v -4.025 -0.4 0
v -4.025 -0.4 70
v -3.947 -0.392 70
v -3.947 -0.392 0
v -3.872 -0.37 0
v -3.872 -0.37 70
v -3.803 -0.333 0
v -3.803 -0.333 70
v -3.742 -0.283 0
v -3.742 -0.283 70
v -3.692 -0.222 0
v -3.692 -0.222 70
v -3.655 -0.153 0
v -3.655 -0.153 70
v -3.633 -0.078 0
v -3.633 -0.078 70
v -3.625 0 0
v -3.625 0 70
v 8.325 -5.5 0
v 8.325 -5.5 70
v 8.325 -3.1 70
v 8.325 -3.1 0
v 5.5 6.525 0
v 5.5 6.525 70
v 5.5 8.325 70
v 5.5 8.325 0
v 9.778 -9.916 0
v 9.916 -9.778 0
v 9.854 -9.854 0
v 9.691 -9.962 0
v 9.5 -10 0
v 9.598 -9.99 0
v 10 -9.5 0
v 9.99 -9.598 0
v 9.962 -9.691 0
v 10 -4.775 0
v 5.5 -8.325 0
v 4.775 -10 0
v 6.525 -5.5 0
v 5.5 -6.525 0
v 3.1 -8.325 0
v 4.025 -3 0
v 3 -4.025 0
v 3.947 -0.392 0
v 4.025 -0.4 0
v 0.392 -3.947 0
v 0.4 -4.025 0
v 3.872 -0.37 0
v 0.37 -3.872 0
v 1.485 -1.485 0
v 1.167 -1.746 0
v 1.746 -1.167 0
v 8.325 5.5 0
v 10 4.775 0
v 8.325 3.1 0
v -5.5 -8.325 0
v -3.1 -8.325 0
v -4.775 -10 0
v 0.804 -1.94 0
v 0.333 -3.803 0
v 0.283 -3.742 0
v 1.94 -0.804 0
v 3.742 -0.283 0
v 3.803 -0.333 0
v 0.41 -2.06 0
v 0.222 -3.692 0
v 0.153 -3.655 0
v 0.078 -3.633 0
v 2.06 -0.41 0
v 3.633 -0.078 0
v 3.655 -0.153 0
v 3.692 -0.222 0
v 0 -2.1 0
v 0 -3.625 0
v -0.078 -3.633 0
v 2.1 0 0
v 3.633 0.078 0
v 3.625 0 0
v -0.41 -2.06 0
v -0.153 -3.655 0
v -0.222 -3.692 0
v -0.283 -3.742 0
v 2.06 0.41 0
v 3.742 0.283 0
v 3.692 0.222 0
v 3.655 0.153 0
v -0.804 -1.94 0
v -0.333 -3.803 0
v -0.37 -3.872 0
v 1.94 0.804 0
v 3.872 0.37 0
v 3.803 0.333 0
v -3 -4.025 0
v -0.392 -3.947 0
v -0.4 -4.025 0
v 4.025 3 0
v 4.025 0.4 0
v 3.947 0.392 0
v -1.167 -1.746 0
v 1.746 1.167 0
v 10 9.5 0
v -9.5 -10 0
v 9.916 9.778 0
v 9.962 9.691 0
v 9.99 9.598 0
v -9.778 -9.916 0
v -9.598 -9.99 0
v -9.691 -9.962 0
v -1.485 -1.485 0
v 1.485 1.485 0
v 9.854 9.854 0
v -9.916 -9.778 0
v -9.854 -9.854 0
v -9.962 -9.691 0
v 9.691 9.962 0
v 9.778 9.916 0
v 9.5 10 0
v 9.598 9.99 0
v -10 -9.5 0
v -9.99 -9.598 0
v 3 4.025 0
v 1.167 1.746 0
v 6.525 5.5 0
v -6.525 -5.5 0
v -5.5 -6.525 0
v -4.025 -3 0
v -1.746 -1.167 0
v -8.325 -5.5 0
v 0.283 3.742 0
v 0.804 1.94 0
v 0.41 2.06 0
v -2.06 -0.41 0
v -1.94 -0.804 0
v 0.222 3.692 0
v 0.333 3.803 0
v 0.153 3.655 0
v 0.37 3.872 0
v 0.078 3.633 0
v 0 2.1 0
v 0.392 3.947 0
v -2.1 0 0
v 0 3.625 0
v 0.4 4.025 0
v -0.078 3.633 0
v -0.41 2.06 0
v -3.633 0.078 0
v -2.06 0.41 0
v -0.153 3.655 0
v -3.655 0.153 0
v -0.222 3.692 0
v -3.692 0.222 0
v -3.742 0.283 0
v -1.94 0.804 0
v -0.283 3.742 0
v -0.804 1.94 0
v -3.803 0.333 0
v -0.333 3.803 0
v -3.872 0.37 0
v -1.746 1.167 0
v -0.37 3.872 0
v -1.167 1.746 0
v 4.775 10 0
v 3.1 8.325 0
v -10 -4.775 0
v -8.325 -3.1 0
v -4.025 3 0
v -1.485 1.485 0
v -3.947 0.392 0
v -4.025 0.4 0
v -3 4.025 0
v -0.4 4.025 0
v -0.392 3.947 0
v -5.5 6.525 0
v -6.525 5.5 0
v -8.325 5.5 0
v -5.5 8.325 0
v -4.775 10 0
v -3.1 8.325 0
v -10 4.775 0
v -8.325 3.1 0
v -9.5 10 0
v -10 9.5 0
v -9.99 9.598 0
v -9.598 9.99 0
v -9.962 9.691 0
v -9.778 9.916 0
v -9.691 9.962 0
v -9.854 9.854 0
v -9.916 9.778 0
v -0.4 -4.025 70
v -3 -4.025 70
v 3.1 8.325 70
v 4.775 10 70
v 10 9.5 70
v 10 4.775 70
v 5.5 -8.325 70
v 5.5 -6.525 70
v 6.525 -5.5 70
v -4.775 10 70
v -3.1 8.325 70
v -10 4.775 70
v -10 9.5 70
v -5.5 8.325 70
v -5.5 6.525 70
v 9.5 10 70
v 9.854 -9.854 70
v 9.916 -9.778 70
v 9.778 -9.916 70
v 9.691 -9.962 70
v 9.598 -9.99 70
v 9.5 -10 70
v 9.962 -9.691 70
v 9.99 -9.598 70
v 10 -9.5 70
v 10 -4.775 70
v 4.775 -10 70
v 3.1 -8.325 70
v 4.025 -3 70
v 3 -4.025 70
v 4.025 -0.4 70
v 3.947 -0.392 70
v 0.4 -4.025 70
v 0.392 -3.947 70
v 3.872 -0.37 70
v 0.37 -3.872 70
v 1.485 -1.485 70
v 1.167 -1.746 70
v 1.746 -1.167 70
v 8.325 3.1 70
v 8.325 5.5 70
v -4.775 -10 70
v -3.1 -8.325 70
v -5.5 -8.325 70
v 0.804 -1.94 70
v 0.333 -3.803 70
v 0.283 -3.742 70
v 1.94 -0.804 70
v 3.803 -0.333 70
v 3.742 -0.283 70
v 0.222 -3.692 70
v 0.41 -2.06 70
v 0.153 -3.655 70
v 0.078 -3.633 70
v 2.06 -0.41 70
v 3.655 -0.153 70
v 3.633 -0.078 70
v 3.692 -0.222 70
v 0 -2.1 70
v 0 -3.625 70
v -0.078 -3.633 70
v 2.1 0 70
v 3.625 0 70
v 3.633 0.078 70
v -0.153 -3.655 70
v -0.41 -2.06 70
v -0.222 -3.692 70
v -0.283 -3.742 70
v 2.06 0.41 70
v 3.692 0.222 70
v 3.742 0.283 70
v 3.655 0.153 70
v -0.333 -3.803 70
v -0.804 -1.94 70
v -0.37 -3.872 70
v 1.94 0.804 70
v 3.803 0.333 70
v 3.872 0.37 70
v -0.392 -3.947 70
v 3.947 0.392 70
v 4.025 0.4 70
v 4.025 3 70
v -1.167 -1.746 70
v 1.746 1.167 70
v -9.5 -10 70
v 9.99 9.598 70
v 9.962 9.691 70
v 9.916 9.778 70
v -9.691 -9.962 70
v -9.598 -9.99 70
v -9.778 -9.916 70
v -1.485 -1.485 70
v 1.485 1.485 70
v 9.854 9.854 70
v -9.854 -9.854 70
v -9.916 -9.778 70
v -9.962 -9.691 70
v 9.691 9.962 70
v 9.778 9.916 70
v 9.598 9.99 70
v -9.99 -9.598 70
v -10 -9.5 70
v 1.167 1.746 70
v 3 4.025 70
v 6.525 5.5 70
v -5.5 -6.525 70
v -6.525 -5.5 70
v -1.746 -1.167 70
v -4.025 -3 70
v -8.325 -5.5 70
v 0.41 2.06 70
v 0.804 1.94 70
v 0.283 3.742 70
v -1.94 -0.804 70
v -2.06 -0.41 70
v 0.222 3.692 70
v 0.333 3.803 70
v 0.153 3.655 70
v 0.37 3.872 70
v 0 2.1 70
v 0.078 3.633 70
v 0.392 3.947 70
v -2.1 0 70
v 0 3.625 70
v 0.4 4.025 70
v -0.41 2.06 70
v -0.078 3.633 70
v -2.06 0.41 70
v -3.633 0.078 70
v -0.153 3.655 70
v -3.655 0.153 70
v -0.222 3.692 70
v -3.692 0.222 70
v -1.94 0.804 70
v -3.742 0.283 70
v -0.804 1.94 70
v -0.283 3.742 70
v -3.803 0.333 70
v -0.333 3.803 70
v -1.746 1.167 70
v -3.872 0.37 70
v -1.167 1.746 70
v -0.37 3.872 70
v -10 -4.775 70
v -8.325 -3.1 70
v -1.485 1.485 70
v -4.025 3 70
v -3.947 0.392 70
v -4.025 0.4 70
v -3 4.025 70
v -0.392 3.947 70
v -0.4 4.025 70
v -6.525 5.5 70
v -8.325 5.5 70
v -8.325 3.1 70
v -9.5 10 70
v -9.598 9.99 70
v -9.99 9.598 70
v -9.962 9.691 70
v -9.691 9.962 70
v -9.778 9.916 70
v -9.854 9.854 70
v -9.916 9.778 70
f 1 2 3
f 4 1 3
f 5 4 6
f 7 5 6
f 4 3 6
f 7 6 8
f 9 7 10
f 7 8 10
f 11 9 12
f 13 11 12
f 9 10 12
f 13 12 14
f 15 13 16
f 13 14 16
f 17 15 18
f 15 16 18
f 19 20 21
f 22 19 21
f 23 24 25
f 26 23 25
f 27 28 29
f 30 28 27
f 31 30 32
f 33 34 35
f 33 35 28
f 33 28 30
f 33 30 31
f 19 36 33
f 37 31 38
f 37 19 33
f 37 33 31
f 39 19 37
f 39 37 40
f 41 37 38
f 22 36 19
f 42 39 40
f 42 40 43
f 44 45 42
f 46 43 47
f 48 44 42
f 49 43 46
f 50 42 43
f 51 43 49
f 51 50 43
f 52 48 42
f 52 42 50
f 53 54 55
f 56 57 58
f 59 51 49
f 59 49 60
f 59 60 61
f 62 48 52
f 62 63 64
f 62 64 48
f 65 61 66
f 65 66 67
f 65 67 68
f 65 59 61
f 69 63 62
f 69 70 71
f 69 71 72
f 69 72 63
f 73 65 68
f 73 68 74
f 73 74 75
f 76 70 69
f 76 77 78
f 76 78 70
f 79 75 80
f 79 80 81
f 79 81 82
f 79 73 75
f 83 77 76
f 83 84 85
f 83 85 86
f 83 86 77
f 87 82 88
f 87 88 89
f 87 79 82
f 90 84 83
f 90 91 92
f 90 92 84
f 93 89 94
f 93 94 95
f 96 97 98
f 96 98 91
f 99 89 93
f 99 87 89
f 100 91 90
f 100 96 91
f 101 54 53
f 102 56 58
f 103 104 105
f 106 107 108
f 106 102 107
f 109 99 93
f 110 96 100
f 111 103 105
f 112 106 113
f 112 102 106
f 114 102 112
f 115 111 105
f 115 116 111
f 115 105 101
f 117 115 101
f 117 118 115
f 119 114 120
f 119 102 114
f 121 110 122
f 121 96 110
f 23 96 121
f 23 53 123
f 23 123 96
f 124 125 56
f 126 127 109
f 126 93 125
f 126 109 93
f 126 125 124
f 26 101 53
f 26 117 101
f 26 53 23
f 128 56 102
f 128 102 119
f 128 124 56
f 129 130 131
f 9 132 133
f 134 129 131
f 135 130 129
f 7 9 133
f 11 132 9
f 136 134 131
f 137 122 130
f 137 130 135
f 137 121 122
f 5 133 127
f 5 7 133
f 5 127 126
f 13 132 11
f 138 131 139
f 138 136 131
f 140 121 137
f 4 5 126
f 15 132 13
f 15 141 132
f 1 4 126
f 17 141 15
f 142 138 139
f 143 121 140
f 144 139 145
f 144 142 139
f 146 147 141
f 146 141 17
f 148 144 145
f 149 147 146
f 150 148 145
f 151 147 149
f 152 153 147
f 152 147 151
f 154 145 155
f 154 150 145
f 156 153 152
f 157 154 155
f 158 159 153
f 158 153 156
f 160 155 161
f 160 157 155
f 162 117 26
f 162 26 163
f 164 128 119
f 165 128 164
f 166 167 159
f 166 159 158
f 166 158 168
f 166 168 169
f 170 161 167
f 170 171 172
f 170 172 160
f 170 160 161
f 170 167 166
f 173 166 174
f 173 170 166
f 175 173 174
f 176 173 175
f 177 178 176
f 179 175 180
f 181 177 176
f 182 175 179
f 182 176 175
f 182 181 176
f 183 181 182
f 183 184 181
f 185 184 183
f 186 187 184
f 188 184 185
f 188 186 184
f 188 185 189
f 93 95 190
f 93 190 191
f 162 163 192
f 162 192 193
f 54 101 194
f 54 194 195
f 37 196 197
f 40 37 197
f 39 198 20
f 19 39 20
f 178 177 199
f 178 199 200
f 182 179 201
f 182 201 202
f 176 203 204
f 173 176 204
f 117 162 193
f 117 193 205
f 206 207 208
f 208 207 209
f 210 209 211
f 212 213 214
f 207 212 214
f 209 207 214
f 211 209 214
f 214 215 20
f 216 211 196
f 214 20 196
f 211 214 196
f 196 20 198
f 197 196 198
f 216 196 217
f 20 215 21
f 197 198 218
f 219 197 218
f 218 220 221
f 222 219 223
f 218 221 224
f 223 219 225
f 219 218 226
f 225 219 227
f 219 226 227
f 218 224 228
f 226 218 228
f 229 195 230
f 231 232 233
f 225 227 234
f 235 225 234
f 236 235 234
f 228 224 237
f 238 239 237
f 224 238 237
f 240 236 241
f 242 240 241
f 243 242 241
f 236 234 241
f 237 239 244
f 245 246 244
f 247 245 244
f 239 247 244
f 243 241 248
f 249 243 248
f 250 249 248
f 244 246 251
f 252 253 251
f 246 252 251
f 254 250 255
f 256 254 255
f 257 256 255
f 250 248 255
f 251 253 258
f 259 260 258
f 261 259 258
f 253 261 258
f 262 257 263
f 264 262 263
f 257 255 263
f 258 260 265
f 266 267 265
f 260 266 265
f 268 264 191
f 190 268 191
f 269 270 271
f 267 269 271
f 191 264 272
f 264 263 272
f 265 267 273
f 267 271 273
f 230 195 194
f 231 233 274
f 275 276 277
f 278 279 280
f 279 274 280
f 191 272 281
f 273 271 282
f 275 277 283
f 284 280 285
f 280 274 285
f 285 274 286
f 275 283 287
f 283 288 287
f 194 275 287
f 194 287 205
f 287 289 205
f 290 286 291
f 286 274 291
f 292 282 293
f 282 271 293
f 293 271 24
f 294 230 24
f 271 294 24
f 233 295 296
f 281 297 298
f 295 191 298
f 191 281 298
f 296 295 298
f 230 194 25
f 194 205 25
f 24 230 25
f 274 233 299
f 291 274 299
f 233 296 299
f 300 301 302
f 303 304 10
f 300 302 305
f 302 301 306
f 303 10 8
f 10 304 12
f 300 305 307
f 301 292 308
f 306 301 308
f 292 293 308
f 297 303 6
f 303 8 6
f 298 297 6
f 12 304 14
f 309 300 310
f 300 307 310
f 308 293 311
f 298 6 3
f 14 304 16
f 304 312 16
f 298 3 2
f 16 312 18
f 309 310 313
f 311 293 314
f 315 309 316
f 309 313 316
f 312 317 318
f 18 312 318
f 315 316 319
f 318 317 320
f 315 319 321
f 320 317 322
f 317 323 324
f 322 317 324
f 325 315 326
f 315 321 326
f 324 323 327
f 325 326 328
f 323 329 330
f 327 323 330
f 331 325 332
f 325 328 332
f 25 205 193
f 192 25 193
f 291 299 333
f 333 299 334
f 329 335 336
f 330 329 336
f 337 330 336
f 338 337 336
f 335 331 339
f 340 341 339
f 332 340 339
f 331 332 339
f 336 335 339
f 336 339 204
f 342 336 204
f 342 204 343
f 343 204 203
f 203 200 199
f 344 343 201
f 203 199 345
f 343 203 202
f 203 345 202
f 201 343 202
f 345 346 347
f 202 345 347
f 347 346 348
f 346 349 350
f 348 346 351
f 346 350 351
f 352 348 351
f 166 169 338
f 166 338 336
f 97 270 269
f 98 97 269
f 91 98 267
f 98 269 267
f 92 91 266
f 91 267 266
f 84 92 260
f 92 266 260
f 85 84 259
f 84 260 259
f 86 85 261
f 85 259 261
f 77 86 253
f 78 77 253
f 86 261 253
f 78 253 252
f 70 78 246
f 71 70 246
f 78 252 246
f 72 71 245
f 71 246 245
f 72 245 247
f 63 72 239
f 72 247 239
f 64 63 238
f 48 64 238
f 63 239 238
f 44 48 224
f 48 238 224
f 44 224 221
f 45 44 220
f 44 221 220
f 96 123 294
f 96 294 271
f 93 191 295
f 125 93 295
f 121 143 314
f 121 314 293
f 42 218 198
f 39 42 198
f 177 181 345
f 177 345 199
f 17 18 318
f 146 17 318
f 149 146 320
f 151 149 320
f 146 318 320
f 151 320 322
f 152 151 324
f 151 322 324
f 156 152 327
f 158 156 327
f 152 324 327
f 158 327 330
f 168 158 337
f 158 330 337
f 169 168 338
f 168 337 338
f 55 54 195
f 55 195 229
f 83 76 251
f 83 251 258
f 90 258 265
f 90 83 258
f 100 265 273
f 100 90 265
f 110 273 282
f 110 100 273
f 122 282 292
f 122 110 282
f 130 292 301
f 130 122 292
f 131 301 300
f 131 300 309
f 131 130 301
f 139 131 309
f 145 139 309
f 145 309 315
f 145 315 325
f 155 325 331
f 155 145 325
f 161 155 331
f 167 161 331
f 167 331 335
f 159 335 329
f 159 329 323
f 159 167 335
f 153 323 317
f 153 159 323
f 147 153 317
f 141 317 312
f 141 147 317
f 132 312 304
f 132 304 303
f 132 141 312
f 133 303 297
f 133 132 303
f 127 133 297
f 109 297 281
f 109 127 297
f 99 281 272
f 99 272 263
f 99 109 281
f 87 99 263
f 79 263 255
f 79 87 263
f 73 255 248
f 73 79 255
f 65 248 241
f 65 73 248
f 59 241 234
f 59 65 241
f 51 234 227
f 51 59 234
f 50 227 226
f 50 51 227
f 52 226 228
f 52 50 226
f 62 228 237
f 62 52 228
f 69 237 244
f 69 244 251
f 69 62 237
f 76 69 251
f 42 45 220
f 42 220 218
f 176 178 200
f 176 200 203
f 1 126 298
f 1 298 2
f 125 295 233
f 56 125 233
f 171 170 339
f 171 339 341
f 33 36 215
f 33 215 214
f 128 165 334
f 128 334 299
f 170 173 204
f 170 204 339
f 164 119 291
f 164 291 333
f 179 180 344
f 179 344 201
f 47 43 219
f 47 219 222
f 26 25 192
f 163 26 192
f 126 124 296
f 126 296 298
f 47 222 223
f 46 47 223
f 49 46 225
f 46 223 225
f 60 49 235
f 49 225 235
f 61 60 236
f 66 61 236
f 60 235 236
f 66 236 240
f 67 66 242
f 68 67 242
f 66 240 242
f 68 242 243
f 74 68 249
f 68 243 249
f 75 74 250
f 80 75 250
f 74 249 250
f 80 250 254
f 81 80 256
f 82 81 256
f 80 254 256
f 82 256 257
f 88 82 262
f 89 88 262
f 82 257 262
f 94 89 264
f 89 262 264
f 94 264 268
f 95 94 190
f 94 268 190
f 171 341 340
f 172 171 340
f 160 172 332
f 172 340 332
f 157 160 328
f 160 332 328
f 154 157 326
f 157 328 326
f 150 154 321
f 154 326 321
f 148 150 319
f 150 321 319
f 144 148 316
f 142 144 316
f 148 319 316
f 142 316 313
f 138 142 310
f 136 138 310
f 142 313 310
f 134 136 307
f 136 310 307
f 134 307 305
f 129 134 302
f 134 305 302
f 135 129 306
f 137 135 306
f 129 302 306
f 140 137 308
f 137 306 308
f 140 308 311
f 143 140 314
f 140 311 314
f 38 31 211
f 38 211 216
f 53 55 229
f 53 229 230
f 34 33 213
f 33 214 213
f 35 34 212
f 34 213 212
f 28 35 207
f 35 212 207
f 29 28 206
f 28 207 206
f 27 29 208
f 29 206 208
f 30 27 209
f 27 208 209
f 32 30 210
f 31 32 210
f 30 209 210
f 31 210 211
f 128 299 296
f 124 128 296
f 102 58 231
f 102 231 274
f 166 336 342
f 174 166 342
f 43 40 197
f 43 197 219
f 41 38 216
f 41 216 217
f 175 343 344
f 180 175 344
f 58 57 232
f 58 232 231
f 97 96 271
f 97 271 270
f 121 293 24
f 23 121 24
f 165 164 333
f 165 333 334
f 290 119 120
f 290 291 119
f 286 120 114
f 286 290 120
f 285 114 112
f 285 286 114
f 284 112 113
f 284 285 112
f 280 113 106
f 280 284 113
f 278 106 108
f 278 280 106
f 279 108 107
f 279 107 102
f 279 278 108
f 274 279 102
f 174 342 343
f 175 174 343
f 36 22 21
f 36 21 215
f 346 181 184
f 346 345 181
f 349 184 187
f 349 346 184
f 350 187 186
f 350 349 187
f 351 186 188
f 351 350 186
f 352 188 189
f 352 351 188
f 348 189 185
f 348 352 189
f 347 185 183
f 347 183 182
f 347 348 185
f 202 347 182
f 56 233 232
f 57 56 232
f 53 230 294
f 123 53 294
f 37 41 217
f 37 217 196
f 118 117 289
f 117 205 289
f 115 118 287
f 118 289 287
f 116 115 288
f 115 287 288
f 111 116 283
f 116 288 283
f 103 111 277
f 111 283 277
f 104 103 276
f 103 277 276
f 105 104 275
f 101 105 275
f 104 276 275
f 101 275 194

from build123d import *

# Parameters (mm, degrees)
SKETCH1_R           = 2.1
BOSS_EXTRUDE1_DEPTH = 70
FILLET1_R           = 0.5
CUT_EXTRUDE1_DEPTH  = 72.414284285


with BuildPart() as part:
    # Sketch1 → Boss-Extrude1 (new body)
    with BuildSketch(Plane.XY):
        Polygon((-10, 10), (-4.775, 10), (-3.1, 8.325), (-5.5, 8.325), (-5.5, 6.525), (-3, 4.025), (3, 4.025), (5.5, 6.525), (5.5, 8.325), (3.1, 8.325), (4.775, 10), (10, 10), (10, 4.775), (8.325, 3.1), (8.325, 5.5), (6.525, 5.5), (4.025, 3), (4.025, -3), (6.525, -5.5), (8.325, -5.5), (8.325, -3.1), (10, -4.775), (10, -10), (4.775, -10), (3.1, -8.325), (5.5, -8.325), (5.5, -6.525), (3, -4.025), (-3, -4.025), (-5.5, -6.525), (-5.5, -8.325), (-3.1, -8.325), (-4.775, -10), (-10, -10), (-10, -4.775), (-8.325, -3.1), (-8.325, -5.5), (-6.525, -5.5), (-4.025, -3), (-4.025, 3), (-6.525, 5.5), (-8.325, 5.5), (-8.325, 3.1), (-10, 4.775), align=None)
        Circle(SKETCH1_R, mode=Mode.SUBTRACT)
    extrude(amount=BOSS_EXTRUDE1_DEPTH)

    # Fillet1
    fillet1_edges = [part.edges().sort_by_distance(p)[0] for p in [
        (10, -10, 35),
        (-10, -10, 35),
        (-10, 10, 35),
        (10, 10, 35),
    ]]
    fillet(fillet1_edges, radius=FILLET1_R)

    # Sketch2 → Cut-Extrude1 (cut, through all)
    with BuildSketch(Plane.XY.offset(70)):
        with BuildLine():
            ThreePointArc((-4.025, 0.4), (-4.425, 0), (-4.025, -0.4))
            Line((-4.025, -0.4), (-4.025, 0.4))
        make_face()
        with BuildLine():
            Line((-4.025, 0.4), (-4.025, -0.4))
            ThreePointArc((-4.025, -0.4), (-3.742157288, -0.282842712), (-3.625, 0))
            ThreePointArc((-3.625, 0), (-3.742157288, 0.282842712), (-4.025, 0.4))
        make_face()
        with BuildLine():
            ThreePointArc((0.4, 4.025), (0, 4.425), (-0.4, 4.025))
            Line((-0.4, 4.025), (0.4, 4.025))
        make_face()
        with BuildLine():
            Line((0.4, 4.025), (-0.4, 4.025))
            ThreePointArc((-0.4, 4.025), (0, 3.625), (0.4, 4.025))
        make_face()
        with BuildLine():
            ThreePointArc((4.025, 0.4), (3.625, 0), (4.025, -0.4))
            Line((4.025, -0.4), (4.025, 0.4))
        make_face()
        with BuildLine():
            Line((4.025, 0.4), (4.025, -0.4))
            ThreePointArc((4.025, -0.4), (4.307842712, -0.282842712), (4.425, 0))
            ThreePointArc((4.425, 0), (4.307842712, 0.282842712), (4.025, 0.4))
        make_face()
        with BuildLine():
            ThreePointArc((0.4, -4.025), (0, -3.625), (-0.4, -4.025))
            Line((-0.4, -4.025), (0.4, -4.025))
        make_face()
        with BuildLine():
            Line((0.4, -4.025), (-0.4, -4.025))
            ThreePointArc((-0.4, -4.025), (0, -4.425), (0.4, -4.025))
        make_face()
    extrude(amount=-CUT_EXTRUDE1_DEPTH, mode=Mode.SUBTRACT)


solid = part.part
